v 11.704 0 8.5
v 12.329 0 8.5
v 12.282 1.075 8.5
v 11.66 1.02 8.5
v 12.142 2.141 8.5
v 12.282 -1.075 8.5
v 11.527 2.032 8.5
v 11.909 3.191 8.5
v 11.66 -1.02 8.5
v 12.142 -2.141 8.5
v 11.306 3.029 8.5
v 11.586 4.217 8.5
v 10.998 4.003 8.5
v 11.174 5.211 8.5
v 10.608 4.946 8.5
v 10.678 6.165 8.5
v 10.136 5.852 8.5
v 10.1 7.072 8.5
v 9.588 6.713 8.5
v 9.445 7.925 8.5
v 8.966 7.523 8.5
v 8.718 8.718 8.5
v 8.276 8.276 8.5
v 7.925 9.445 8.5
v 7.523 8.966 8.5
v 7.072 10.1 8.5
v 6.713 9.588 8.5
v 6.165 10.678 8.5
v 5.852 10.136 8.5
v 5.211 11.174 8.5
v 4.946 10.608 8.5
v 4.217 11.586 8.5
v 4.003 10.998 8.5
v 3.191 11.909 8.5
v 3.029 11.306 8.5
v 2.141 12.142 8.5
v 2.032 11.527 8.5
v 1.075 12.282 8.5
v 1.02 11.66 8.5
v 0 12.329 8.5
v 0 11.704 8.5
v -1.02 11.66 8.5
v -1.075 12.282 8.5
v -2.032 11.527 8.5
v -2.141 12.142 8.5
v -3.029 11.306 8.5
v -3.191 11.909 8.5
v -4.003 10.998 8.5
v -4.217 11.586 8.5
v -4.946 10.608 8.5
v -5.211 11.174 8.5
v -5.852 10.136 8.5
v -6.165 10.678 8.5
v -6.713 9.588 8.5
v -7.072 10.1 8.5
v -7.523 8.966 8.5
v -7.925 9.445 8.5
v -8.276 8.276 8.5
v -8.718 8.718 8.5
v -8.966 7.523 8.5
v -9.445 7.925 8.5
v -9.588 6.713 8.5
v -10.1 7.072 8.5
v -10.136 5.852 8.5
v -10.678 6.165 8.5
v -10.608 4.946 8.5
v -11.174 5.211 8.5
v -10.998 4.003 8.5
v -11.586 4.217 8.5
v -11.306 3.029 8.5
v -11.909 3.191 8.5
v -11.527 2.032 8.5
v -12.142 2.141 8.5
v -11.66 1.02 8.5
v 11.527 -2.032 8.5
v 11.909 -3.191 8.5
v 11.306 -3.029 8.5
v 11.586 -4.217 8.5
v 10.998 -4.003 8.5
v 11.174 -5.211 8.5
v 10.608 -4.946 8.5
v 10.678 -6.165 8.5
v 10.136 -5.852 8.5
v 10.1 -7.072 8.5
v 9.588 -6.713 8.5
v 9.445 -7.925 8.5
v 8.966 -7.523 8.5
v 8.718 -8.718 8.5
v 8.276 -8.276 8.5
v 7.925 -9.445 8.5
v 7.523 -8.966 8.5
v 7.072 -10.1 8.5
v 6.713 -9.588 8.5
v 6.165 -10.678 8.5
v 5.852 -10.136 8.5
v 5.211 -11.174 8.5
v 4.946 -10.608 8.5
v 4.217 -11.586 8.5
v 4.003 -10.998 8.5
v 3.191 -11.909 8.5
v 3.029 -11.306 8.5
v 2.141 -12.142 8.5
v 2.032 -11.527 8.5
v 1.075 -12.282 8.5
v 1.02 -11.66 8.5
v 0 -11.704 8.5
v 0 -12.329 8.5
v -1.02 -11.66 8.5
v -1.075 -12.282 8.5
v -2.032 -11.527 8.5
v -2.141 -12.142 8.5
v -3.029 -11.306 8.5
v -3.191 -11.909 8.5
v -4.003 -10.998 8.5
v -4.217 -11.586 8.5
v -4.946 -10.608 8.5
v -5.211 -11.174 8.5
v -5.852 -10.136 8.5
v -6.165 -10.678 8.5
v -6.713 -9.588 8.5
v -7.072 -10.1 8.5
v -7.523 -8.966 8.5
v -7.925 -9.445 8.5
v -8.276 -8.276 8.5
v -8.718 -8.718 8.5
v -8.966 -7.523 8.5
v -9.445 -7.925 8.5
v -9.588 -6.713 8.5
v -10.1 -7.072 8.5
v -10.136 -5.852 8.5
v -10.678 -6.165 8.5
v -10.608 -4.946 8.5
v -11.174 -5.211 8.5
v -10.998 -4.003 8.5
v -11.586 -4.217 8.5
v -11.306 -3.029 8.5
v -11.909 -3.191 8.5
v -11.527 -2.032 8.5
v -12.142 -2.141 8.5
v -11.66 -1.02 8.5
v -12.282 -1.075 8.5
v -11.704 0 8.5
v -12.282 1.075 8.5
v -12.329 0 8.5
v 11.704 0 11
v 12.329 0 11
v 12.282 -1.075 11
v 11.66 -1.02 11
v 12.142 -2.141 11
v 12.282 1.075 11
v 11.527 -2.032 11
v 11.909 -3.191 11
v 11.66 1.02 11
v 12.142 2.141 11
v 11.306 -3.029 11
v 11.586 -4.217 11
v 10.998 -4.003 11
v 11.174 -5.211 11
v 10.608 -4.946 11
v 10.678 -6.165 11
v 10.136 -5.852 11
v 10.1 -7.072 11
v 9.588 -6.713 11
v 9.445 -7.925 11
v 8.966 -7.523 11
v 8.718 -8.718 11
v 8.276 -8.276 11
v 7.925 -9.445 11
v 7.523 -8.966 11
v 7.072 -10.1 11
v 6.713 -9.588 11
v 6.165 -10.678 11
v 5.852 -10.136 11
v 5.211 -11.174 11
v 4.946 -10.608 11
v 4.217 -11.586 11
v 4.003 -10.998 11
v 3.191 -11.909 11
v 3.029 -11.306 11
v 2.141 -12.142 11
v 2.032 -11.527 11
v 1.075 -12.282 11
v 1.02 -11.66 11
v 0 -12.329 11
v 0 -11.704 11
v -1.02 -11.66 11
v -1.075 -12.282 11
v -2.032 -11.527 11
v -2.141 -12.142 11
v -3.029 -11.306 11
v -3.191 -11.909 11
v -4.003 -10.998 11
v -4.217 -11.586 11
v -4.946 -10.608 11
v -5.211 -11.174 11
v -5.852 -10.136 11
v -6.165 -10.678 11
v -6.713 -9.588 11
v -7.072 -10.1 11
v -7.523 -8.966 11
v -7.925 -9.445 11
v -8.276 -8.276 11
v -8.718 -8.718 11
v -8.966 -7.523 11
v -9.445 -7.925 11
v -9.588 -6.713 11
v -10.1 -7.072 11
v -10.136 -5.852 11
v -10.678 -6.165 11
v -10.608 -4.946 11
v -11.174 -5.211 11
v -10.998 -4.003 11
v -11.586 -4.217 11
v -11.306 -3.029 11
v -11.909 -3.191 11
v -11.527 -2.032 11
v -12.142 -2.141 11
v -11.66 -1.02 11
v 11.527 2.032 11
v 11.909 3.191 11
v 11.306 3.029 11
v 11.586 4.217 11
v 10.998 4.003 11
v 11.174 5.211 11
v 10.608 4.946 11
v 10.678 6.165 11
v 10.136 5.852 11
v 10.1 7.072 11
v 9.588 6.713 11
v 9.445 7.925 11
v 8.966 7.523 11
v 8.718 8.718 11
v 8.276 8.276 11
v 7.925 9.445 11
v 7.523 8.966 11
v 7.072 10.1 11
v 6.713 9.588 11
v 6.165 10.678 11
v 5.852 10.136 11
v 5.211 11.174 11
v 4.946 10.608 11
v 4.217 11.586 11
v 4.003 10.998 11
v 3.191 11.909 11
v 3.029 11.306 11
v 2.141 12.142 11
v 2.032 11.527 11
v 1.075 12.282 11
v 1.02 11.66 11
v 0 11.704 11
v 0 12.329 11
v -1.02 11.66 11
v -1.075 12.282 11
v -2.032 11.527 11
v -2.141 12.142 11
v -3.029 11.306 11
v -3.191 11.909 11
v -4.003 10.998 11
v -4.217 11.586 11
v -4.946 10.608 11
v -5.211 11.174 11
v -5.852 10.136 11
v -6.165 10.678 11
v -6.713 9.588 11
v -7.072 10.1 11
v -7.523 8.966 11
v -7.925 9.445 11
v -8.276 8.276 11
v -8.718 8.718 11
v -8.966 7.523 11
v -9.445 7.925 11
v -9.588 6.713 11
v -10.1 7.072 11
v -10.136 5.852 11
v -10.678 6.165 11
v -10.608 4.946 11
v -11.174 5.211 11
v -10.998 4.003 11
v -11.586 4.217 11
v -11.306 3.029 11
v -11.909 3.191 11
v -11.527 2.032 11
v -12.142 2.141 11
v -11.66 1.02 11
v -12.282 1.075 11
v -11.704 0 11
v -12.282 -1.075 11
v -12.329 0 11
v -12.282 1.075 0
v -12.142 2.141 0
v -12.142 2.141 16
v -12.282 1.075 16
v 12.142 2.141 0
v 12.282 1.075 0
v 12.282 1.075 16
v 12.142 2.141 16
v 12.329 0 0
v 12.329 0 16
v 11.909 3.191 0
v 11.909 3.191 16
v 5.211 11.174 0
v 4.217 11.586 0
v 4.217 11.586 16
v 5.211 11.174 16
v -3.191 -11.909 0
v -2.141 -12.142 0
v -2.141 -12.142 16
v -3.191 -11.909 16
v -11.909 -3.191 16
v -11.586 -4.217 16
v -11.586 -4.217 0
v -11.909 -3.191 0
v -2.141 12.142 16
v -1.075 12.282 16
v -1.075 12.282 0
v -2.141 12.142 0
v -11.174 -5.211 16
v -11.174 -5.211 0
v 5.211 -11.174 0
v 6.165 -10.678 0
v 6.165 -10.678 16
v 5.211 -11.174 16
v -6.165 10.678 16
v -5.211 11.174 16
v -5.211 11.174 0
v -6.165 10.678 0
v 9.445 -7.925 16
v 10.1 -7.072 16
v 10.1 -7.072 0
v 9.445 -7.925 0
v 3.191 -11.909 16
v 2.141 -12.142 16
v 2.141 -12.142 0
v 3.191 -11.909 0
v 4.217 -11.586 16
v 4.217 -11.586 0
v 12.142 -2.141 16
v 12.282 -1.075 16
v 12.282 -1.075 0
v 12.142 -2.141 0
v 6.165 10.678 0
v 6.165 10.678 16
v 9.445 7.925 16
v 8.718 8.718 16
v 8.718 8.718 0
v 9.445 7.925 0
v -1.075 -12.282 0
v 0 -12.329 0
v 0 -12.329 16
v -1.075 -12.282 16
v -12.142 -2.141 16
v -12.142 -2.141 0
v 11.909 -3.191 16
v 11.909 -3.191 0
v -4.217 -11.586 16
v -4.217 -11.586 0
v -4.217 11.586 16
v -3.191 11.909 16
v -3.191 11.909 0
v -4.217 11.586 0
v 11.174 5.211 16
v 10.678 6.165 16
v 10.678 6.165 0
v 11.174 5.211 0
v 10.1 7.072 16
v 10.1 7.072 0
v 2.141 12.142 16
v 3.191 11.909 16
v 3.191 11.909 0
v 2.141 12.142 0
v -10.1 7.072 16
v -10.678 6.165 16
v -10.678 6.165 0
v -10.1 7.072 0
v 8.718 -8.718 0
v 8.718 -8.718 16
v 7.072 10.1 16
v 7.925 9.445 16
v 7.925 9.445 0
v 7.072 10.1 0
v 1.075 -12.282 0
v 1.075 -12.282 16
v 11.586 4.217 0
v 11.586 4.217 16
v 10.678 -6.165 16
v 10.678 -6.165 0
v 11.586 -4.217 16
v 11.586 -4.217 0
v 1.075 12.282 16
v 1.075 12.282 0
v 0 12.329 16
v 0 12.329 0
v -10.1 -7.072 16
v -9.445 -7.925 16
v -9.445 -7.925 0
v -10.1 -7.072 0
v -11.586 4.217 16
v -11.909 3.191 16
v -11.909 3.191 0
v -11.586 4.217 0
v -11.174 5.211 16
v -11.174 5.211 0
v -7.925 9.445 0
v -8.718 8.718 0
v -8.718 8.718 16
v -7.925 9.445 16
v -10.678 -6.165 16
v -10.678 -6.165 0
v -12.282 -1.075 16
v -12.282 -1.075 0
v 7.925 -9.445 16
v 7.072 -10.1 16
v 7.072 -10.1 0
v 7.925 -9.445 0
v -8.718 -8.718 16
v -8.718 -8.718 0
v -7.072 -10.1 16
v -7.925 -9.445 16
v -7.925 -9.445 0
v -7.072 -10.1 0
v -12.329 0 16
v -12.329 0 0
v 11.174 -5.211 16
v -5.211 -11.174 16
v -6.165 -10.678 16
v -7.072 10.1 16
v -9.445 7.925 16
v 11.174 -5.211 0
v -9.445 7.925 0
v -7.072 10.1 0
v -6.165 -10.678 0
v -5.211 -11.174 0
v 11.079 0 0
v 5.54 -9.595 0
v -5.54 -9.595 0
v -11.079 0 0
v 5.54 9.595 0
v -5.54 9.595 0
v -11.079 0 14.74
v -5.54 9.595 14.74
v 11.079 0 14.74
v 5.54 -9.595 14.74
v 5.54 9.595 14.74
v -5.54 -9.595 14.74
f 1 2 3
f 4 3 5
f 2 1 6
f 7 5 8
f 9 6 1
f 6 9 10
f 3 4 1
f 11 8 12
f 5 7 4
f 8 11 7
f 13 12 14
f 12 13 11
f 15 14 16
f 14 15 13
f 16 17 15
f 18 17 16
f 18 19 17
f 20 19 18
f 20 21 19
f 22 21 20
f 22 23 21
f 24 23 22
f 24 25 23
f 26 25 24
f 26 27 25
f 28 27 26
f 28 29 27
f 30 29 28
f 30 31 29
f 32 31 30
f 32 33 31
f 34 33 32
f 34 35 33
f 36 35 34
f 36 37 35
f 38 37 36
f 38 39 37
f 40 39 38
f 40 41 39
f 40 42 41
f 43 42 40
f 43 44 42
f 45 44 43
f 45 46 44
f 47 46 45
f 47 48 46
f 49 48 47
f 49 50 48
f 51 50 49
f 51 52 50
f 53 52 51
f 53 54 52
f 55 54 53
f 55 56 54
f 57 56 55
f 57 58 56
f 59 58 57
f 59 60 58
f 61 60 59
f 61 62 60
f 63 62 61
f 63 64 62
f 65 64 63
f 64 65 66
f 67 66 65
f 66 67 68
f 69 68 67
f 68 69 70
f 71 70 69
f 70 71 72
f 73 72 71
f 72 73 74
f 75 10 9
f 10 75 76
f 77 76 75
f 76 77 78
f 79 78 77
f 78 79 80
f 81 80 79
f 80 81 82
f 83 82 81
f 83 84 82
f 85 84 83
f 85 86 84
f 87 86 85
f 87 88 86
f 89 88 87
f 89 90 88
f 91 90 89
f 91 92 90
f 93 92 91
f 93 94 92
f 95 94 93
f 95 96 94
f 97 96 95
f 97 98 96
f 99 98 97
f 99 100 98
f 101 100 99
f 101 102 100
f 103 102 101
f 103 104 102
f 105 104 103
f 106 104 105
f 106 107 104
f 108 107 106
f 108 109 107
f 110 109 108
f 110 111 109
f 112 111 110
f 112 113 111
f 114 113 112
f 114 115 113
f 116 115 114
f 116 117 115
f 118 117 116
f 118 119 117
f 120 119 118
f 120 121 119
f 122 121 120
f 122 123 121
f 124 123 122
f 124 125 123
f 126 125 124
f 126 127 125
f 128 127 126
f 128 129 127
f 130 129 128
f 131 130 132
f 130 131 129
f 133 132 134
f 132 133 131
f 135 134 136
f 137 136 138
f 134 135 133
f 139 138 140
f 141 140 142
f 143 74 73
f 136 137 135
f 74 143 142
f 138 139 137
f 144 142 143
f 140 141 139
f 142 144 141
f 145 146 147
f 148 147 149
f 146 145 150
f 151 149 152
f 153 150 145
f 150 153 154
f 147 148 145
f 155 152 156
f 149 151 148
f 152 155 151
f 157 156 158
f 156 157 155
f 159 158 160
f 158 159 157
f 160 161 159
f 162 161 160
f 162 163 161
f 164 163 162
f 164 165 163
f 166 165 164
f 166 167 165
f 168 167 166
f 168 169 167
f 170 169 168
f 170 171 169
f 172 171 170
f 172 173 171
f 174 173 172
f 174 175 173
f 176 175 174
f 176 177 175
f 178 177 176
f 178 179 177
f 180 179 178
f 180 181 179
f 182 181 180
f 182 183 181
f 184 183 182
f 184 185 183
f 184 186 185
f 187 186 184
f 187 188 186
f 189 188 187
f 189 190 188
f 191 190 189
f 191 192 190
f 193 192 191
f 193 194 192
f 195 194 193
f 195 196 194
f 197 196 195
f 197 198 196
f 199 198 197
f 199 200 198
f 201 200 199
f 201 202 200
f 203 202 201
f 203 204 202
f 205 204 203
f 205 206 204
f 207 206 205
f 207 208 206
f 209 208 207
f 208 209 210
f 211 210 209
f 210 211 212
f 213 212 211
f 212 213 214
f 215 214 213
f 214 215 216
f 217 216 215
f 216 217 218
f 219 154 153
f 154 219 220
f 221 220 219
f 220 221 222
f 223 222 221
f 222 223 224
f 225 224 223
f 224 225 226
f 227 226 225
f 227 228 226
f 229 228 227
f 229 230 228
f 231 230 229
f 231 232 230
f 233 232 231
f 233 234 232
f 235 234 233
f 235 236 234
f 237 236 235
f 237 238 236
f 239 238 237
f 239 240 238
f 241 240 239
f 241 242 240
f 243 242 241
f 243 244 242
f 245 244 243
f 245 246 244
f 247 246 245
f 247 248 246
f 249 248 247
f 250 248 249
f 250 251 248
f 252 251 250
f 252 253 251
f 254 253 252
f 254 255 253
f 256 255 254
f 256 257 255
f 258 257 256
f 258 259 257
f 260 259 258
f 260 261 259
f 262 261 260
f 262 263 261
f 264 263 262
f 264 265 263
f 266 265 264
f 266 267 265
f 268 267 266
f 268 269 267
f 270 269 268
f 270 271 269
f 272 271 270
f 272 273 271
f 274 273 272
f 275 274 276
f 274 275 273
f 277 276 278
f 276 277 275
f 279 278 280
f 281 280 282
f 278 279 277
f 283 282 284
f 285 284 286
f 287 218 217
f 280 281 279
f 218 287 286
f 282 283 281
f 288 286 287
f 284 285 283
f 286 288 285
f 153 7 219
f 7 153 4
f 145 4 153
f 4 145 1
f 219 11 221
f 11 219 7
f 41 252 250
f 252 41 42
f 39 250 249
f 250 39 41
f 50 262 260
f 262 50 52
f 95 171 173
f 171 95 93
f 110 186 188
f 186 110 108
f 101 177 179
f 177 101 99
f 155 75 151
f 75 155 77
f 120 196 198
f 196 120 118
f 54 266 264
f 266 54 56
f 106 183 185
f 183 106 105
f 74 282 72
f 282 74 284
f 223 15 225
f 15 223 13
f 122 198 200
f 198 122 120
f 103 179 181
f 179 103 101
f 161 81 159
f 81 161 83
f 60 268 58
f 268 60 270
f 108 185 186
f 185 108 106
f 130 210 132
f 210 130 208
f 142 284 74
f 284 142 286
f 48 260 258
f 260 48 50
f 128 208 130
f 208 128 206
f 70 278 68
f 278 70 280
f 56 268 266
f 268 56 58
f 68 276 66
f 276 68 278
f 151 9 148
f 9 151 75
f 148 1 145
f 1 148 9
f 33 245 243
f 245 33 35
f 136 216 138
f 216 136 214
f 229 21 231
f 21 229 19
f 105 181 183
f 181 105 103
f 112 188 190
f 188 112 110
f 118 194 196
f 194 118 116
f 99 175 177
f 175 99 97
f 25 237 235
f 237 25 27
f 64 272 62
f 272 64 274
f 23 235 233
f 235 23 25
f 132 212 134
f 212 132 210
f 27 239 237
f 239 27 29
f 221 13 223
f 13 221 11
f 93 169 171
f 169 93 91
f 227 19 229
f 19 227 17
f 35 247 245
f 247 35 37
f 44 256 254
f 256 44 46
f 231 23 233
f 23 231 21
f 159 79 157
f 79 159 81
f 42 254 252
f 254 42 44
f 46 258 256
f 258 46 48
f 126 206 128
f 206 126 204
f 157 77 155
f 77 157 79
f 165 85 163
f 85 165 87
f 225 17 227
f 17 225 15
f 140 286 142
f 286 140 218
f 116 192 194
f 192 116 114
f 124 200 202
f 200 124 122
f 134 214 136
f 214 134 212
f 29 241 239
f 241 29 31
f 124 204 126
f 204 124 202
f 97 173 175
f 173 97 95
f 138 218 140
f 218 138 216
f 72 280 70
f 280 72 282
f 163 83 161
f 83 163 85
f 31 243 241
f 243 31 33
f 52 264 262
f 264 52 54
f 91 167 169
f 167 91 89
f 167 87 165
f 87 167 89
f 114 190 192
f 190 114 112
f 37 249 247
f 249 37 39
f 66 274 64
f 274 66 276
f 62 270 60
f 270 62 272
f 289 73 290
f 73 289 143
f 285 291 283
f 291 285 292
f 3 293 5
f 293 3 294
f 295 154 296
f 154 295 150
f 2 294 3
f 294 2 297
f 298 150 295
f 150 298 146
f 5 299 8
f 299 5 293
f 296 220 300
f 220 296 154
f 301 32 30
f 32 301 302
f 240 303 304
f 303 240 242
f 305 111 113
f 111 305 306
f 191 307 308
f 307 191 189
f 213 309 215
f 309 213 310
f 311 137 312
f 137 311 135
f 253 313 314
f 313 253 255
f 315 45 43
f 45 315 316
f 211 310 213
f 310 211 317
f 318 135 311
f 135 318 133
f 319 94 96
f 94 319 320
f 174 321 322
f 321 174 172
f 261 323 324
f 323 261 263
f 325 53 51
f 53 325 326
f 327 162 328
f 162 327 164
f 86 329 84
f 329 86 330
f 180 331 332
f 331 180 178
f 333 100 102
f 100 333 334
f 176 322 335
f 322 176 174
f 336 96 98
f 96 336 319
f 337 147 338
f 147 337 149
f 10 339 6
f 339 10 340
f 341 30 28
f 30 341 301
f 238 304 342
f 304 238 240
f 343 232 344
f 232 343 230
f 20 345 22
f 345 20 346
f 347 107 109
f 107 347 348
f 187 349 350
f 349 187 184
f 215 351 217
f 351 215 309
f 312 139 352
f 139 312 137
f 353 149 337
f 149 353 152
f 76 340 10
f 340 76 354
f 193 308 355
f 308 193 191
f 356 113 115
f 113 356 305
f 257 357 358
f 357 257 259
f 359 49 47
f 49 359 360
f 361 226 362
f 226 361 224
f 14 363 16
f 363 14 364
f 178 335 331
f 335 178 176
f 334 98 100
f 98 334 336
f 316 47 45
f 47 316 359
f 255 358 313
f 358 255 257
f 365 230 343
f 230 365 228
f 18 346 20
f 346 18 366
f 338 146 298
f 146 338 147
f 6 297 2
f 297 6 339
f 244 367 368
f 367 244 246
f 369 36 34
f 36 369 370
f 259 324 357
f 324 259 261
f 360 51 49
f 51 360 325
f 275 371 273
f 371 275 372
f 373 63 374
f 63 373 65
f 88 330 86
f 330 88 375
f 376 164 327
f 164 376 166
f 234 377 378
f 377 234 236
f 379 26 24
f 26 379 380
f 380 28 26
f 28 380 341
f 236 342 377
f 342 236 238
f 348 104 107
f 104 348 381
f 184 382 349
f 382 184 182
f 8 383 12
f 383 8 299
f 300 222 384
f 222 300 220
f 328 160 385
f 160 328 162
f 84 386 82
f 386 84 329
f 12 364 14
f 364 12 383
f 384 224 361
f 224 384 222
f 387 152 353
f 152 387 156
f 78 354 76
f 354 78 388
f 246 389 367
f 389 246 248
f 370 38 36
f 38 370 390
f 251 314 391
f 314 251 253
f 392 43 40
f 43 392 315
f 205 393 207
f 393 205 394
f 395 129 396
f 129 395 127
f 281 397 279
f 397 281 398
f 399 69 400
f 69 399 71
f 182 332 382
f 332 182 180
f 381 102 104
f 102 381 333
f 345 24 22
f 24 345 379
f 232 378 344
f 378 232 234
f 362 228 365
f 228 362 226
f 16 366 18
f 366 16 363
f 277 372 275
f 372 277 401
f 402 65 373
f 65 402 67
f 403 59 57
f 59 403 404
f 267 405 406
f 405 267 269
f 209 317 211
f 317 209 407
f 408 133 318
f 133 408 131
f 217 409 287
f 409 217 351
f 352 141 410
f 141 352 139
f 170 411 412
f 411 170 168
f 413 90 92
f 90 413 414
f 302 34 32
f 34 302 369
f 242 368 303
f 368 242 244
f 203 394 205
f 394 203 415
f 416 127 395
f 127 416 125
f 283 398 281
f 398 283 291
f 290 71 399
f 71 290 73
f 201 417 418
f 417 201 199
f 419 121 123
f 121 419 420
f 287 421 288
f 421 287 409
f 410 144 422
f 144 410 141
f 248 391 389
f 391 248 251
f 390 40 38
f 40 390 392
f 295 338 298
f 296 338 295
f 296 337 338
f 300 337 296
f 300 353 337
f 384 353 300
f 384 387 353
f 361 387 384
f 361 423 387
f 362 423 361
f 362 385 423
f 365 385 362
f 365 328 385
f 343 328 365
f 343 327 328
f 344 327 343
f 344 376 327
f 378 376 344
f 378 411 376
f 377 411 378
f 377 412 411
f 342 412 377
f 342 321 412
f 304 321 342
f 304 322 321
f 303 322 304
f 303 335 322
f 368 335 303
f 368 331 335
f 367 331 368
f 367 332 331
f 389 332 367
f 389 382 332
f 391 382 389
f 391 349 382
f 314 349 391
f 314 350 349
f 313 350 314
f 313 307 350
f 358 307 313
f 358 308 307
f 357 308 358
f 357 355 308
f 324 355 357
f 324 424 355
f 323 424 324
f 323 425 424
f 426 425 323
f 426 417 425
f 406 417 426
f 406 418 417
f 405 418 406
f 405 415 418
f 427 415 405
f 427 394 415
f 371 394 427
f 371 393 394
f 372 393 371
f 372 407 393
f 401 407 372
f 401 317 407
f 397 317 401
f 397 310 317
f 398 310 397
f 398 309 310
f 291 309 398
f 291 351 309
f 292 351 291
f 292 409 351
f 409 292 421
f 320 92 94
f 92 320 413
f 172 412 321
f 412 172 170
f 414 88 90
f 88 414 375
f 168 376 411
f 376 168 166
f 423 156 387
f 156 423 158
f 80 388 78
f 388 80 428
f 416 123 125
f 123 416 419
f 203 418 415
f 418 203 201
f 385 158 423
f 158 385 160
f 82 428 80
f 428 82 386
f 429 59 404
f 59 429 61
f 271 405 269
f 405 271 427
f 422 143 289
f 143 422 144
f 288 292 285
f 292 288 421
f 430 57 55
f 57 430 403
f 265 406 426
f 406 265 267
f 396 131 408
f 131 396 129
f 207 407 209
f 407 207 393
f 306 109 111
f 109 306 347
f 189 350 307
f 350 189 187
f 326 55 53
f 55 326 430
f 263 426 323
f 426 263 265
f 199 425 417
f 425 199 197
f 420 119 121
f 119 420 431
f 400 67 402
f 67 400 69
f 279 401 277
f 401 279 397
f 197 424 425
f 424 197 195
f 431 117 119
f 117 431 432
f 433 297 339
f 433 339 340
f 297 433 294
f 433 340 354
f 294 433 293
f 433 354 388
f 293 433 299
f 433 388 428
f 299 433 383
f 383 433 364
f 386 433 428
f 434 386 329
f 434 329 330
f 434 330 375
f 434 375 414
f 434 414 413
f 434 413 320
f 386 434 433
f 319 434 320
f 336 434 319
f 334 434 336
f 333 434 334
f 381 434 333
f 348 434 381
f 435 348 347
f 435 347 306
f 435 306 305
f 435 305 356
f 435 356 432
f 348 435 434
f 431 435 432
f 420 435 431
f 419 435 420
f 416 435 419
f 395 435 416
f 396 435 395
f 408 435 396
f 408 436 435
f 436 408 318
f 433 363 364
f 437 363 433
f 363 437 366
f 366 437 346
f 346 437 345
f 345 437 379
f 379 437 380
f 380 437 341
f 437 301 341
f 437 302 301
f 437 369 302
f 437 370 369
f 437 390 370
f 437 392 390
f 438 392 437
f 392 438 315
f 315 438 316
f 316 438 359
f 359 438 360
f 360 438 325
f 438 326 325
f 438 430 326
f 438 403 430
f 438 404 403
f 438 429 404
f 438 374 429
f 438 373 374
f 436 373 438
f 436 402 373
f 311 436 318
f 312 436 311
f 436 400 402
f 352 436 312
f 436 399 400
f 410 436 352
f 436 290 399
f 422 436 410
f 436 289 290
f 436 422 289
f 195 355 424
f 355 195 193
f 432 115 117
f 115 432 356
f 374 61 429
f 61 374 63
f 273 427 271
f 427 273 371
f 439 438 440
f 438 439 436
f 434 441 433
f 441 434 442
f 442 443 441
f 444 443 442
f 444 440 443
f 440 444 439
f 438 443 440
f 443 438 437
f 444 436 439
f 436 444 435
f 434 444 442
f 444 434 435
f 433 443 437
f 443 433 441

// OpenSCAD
// Licensed under the terms of CC BY-SA 4.0 DEED
// Attribution-ShareAlike 4.0 International.
// For full licensing terms, see
// https://creativecommons.org/licenses/by-sa/4.0/deed.en
// Source code at https://github.com/yegct/openscad_projects/tree/main/wheel_nut_cover


// For smoothing purposes
$fs = $preview ? $fs : 0.2;
$fa = $preview ? $fa : 5;

// What to print
object = "cover"; // [cover, puller]
// Typically 17 or 19 or 21
nut_size = 19;
height = 16;
cover_thickness = 1.25;
puller_thickness = 4;

// Fix OpenSCAD preview rendering problem
function epsilon() = 0.01;

// We use a circle approximated with six sides,
// i.e. a regular hexagon.
// Our nut size is the short diagonal of this hexagon
// but we need to use the long diagonal as the
// circle's diameter.
function long_diagonal(short_diagonal) =
    short_diagonal * 2 / sqrt(3);

// Add a bit of wiggle room.    
outer_diam = long_diagonal(short_diagonal = nut_size) * 1.01;

module hexagon(r = 0, d = 0) {
    if (r == 0) {
        circle(d = d, $fn = 6);
    } else {
        circle(r = r, $fn = 6);
    }
}

module cover_grip() {
    difference() {
        cylinder(h = 2.5, d = outer_diam + cover_thickness * 2 + epsilon());
        cylinder(h = 2.5, d = outer_diam + cover_thickness);
    }
}

module nut_cover() {
    difference() {
        // outside
        cylinder(h = height, d = outer_diam + cover_thickness * 2);

        // inside
        translate([0, 0, -epsilon()])
        linear_extrude(height - cover_thickness)
        hexagon(d = outer_diam);
    
        translate([0, 0, height - 2.5 * 3])
        cover_grip();
    }
}

module puller_curved_bit(puller_diam) {
    difference() {
        circle(d = puller_diam);
        circle(d = puller_diam - puller_thickness);
        translate([0, puller_diam / 2, 0])
        square([puller_diam, puller_diam], center = true);
    }
}

module puller_long_arms(puller_diam) {
    translate([0, puller_diam, 0])
    difference() {
        square([puller_diam, puller_diam * 2], center = true);
        square([puller_diam - puller_thickness, puller_diam * 2 + epsilon()], center = true);
    }
}

module puller_crossbar(puller_diam) {
    translate([0, puller_diam * 1, 0])
    square([puller_diam, 1.5], center = true);
}

// Two quarter-circles to grab on to the cover notch
module puller_end_catches(puller_diam) {
    translate([-puller_diam/2, puller_diam * 2, 0])
    rotate_extrude(angle = 90)
    square([puller_thickness, 10]);

    translate([puller_diam/2, puller_diam * 2, 0])
    rotate([0, 0, 90])
    rotate_extrude(angle = 90)
    square([puller_thickness, 10]);
}

module puller() {
    puller_diam = outer_diam * 1.2;
    
    linear_extrude(10) {
        puller_curved_bit(puller_diam);
        puller_long_arms(puller_diam);
        puller_crossbar(puller_diam);
    }
    puller_end_catches(puller_diam);
}

if (object == "cover")
    nut_cover();
else
    puller();
